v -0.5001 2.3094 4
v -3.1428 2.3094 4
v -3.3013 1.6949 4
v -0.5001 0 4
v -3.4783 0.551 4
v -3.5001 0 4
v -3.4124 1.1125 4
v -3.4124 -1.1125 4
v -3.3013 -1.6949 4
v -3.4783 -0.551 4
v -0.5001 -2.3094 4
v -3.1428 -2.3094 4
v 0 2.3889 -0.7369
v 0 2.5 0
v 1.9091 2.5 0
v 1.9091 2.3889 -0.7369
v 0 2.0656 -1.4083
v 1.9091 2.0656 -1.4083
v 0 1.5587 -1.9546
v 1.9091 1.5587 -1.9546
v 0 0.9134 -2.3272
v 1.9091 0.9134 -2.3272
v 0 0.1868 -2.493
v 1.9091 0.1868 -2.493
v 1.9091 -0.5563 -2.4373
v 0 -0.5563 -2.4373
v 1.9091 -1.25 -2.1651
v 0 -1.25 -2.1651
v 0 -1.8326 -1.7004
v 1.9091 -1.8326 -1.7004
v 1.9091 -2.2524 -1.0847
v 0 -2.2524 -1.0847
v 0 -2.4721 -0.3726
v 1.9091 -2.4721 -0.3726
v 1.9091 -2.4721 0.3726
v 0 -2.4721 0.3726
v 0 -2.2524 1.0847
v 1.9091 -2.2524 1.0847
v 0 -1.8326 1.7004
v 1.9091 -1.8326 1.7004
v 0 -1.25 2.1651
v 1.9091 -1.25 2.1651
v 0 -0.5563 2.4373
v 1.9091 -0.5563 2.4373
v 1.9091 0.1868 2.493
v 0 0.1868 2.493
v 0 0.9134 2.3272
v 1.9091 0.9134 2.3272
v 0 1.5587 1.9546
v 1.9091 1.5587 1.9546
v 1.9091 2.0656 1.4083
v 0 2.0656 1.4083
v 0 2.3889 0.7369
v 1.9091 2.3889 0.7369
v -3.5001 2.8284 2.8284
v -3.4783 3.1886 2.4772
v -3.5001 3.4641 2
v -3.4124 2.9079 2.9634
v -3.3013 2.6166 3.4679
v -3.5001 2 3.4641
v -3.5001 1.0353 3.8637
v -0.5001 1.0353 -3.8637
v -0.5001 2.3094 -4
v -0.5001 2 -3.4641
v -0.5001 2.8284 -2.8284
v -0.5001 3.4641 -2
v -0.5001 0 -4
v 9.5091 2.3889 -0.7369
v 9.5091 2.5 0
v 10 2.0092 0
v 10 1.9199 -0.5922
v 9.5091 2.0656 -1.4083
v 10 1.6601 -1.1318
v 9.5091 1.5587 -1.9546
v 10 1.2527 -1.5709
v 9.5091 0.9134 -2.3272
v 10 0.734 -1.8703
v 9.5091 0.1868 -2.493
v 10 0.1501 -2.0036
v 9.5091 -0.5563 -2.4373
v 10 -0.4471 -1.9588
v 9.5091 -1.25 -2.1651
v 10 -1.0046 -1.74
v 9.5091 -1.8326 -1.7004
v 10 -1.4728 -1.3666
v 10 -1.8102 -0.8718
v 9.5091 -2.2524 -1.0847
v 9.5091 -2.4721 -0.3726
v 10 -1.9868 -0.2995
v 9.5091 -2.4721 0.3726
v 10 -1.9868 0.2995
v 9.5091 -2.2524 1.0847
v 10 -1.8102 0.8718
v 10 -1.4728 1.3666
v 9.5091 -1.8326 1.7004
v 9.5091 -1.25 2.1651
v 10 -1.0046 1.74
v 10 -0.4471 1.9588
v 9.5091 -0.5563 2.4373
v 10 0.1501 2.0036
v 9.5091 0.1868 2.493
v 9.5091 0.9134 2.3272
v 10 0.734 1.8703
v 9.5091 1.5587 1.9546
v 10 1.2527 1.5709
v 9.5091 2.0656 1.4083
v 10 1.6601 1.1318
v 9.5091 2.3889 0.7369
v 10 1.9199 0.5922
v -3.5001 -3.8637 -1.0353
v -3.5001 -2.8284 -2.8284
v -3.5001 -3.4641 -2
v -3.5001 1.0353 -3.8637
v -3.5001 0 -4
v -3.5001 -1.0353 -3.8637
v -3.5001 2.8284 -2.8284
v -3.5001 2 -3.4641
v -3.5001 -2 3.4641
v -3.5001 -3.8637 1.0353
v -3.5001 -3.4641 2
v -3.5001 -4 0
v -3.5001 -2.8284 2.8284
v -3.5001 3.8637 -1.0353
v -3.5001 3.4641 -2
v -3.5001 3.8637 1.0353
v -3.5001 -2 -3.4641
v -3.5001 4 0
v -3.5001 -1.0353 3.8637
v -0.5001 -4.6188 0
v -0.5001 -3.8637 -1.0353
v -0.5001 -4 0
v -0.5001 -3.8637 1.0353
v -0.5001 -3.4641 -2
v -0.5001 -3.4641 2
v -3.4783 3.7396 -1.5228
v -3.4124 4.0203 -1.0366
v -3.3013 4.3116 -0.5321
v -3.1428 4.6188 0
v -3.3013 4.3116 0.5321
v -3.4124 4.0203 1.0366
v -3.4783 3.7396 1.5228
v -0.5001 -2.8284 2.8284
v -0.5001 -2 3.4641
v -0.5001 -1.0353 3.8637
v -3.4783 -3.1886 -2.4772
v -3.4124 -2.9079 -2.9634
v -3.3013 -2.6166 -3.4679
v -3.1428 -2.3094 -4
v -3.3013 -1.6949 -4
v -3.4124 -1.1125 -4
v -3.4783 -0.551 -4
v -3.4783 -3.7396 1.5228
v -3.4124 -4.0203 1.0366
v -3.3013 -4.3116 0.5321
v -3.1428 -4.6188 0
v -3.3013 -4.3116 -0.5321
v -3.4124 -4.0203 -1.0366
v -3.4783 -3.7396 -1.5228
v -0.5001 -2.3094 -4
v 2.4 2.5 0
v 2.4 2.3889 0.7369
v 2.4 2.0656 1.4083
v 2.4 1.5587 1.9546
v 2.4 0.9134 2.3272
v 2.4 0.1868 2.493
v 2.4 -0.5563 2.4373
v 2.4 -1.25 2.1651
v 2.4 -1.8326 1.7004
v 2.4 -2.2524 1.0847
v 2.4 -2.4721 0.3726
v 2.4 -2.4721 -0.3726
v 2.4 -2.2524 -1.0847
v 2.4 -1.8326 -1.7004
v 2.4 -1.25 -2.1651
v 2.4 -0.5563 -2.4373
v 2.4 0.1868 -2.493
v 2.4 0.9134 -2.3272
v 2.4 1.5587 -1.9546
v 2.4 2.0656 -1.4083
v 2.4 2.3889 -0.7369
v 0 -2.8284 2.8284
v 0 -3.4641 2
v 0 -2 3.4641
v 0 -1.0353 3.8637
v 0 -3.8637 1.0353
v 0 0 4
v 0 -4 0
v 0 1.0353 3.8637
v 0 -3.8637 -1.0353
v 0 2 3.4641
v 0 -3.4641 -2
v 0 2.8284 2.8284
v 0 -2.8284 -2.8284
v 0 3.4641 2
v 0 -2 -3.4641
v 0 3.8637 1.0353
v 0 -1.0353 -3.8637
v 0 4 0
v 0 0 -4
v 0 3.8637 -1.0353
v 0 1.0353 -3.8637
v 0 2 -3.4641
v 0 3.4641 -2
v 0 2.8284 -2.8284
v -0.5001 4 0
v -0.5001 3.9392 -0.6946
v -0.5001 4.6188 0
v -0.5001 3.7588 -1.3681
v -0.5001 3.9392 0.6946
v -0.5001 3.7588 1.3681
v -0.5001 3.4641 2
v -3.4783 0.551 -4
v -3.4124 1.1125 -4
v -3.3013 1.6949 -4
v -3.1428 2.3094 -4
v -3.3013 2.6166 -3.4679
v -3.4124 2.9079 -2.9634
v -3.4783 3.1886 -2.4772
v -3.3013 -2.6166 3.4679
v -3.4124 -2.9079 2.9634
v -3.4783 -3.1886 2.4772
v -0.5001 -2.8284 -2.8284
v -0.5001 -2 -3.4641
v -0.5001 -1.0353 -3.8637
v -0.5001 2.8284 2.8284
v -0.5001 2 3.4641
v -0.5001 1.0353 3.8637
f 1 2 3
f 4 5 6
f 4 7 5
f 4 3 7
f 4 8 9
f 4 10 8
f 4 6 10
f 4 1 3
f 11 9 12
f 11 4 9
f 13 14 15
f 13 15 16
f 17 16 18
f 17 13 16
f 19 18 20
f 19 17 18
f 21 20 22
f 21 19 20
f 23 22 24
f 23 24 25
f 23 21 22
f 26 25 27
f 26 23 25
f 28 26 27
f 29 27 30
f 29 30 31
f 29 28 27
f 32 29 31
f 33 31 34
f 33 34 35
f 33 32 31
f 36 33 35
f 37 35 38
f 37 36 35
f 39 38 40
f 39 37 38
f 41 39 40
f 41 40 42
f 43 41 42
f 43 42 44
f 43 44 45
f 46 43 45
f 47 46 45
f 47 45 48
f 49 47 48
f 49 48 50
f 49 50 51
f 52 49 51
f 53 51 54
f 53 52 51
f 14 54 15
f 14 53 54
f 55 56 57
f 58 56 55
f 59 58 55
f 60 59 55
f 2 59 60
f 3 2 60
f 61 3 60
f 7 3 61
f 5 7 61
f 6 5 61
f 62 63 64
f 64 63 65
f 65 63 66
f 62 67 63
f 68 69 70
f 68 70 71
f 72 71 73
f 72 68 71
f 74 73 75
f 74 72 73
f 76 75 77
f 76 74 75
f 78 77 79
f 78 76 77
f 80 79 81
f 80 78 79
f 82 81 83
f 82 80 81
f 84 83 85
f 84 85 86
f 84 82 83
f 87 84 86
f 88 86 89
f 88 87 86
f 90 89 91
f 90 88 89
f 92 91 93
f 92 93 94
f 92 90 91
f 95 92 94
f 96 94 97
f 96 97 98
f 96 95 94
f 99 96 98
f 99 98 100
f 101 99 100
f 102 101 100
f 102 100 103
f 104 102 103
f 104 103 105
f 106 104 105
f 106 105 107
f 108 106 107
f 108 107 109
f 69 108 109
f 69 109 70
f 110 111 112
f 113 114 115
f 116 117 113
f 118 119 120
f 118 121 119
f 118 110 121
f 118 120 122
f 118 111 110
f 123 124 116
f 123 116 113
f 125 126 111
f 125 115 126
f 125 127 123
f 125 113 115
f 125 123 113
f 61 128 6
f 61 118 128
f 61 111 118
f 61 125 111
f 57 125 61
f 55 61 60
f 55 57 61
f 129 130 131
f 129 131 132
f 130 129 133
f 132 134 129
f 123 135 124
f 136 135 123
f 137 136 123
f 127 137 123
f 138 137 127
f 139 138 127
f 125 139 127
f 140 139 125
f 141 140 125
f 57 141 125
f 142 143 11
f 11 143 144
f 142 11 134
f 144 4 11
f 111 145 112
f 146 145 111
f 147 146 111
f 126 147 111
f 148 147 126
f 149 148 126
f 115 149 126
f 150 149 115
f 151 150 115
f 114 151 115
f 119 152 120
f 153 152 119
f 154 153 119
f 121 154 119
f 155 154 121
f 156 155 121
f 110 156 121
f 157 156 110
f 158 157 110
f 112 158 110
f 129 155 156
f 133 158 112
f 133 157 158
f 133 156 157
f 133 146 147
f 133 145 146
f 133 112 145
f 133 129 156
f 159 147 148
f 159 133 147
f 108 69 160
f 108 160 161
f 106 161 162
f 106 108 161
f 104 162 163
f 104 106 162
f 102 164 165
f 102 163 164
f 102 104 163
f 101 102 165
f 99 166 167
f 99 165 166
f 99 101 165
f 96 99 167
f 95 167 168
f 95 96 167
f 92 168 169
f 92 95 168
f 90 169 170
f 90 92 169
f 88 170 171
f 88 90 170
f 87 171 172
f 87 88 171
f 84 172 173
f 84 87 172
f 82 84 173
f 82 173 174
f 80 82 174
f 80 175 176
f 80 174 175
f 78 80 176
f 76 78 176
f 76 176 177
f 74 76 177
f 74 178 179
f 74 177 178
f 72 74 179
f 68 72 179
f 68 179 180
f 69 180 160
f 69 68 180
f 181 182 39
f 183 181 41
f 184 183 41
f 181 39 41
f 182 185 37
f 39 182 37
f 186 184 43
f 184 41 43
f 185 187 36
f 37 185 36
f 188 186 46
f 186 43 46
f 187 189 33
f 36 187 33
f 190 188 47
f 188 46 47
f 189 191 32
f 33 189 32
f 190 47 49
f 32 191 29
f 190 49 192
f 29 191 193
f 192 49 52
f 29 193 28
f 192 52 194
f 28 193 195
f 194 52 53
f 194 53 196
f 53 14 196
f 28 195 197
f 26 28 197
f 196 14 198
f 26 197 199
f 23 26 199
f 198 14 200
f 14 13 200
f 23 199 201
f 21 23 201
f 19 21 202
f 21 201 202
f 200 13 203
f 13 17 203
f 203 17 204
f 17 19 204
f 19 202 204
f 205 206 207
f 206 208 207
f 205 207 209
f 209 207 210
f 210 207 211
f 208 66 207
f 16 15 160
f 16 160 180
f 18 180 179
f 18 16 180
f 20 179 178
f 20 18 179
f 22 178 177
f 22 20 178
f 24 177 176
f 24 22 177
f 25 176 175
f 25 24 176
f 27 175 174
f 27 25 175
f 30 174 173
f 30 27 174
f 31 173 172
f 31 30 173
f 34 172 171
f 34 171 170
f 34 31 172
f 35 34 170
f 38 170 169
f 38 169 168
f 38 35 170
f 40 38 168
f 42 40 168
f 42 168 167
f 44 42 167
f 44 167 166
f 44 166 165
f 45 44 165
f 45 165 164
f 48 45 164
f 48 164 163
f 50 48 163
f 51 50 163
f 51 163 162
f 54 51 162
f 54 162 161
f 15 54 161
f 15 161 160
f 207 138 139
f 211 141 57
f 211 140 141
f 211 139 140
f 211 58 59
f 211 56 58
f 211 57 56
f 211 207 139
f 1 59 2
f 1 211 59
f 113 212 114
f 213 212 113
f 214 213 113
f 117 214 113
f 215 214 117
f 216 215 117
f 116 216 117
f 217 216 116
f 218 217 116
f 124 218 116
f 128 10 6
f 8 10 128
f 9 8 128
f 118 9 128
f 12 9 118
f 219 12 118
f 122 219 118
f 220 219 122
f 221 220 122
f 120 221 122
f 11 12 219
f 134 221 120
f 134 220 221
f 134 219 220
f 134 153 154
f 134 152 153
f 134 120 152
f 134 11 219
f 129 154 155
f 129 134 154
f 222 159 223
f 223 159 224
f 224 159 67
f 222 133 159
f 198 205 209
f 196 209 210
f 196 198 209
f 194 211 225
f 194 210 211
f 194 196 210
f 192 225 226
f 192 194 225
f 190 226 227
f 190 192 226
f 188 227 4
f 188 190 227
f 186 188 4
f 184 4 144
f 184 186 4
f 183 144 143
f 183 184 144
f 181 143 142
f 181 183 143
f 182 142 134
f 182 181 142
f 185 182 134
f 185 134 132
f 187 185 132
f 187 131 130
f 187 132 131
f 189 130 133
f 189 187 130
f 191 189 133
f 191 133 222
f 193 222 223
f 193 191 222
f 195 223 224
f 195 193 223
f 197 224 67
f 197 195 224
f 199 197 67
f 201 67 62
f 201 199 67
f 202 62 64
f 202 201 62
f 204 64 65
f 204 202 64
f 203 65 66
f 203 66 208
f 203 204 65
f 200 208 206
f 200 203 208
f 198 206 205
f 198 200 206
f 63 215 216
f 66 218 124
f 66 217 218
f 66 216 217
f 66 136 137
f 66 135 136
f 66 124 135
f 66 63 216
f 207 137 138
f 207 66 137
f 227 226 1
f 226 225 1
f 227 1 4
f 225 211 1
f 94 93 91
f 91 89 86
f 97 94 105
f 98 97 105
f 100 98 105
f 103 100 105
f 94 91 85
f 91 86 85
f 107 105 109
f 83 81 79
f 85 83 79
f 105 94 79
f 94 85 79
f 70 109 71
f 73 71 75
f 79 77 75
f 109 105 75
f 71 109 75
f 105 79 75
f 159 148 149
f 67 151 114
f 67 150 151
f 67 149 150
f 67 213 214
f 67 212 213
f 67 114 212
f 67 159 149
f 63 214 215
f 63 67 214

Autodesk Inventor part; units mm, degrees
ref_plane "YZ Plane" through (0, 0, 0) normal (1, 0, 0) x (0, 1, 0)
ref_plane "XZ Plane" through (0, 0, 0) normal (0, 1, 0) x (-1, 0, 0)
sketch "Sketch1" plane through (0, 0, 0) normal (0, 0, 1) x (1, 0, 0)
  line L0 (0, 4) -> (0, 2.5)
  line L1 (2.4, 2.5) -> (10, 2.5)
  line L2 (10, 2.5) -> (10, 0)
  line L3 (10, 0) -> (-0.5001, 0)
  line L4 (-2.6001, 0) -> (12.1, 0) projected
  line L5 (-0.5001, 0) -> (-0.5001, 4)
  line L6 (-0.5001, 4) -> (0, 4)
  line L7 (2.4, 2.5) -> (1.9091, 2.5)
  line L8 (1.9091, 2.5) -> (0, 2.5)
  line L9 (0, -0.8) -> (0, 4.8) projected
  dimension "d0" = 10
  dimension "d1" = 7.6
  dimension "d2" = 5
  dimension "d9" = 0.5001
  dimension "d10" = 8
  dimension "d13" = 0.4909
  dimension "d14" = 5
revolve "Body" add sketch "Sketch1" angle 360 about axis through (10, 0, 0) along (-1, 0, 0)
sketch "Sketch2" plane through (-0.5001, 0, 0) normal (-1, 0, 0) x (0, 0, 1)
  line L0 (0, 4.6188) -> (4, 2.3094)
  line L1 (4, 2.3094) -> (4, -2.3094)
  line L2 (4, -2.3094) -> (0, -4.6188)
  line L3 (0, -4.6188) -> (-4, -2.3094)
  line L4 (-4, -2.3094) -> (-4, 2.3094)
  line L5 (-4, 2.3094) -> (0, 4.6188)
  point P0 (0, 0)
  point P1 (0, 0)
  dimension "d11" = 8
extrude "Head" add sketch "Sketch2" along normal blind 3
sketch "Sketch4" plane through (0, 0, 0) normal (0, 0, 1) x (1, 0, 0)
  line L0 (-3.5001, 4) -> (-3.5001, 4.6188)
  line L1 (-3.5001, 4.6188) -> (-3.1428, 4.6188)
  line L2 (-3.1428, 4.6188) -> (-3.5001, 4)
  line L3 (-4.1001, 0) -> (0.0999, 0) projected
  line L4 (-0.5001, 4.6188) -> (-3.5001, 4.6188) projected
  line L5 (-3.5001, 2.3094) -> (-3.5001, 4.6188) projected
  dimension "d5" = 30
  dimension "d19" = 8
revolve "Chamfer1" cut sketch "Sketch4" angle 360 about axis through (-10, 0, 0) along (1, 0, 0)
thread "Thread" size "M5x0.8" class "6g" standard "ISO Metric profile" length 7.6
chamfer "Chamfer2" distance 0.4908 distance2 0.4909 1 edges at (10, -2.5, 0) measured on face at (10, -0.7379, 0.3873)
ref_plane "Work Plane1" through (1.525, 0, 0) normal (0, 0, 1) x (1, 0, 0)
equation "\"d0\" = NLG"
equation "\"d1\" = GEL"
equation "\"d2\" = GD"
equation "\"d10\" = SD2"
equation "\"d14\" = BDM"
equation "\"d11\" = SW"
equation "\"d3\" = KOH - SD"
equation "\"d5\" = ANG1"
equation "\"d19\" = SW0"
equation "\"d15\" = GEL"
equation "\"d6\" = -0.5 * SPD + 0.5 * GD"
equation "\"NLG\" = 10"
equation "\"GD\" = NND"
equation "\"BDM\" = NND"
equation "\"KOH\" = 3.5"
equation "\"GEL\" = 7.6"
equation "\"SW\" = 8"
equation "\"SW0\" = SW"
equation "\"SPD\" = NND - 1.2269 * PTC"
equation "\"SD2\" = SW"
equation "\"SD\" = 0.5"
equation "\"ANG1\" = 30deg"
equation "\"GAL\" = 0.61345 * PTC"
equation "\"GUL\" = 0.61345 * PTC"
equation "\"RR\" = 0.2"
equation "\"WFT\" = SD"
equation "\"GD1\" = THREADDIA - 1.2269 * PTC"
equation "\"THREADDIA\" = 5"
equation "\"SDH\" = SW"
equation "\"TOA\" = 30deg"
equation "\"FAWI\" = 45deg"
equation "\"PTC\" = 0.8"
equation "\"NND\" = 5"
equation "\"E0\" = 1.155 * SW"
properties part number "AS 1110 - M5 x 10" material "Steel, Mild"
